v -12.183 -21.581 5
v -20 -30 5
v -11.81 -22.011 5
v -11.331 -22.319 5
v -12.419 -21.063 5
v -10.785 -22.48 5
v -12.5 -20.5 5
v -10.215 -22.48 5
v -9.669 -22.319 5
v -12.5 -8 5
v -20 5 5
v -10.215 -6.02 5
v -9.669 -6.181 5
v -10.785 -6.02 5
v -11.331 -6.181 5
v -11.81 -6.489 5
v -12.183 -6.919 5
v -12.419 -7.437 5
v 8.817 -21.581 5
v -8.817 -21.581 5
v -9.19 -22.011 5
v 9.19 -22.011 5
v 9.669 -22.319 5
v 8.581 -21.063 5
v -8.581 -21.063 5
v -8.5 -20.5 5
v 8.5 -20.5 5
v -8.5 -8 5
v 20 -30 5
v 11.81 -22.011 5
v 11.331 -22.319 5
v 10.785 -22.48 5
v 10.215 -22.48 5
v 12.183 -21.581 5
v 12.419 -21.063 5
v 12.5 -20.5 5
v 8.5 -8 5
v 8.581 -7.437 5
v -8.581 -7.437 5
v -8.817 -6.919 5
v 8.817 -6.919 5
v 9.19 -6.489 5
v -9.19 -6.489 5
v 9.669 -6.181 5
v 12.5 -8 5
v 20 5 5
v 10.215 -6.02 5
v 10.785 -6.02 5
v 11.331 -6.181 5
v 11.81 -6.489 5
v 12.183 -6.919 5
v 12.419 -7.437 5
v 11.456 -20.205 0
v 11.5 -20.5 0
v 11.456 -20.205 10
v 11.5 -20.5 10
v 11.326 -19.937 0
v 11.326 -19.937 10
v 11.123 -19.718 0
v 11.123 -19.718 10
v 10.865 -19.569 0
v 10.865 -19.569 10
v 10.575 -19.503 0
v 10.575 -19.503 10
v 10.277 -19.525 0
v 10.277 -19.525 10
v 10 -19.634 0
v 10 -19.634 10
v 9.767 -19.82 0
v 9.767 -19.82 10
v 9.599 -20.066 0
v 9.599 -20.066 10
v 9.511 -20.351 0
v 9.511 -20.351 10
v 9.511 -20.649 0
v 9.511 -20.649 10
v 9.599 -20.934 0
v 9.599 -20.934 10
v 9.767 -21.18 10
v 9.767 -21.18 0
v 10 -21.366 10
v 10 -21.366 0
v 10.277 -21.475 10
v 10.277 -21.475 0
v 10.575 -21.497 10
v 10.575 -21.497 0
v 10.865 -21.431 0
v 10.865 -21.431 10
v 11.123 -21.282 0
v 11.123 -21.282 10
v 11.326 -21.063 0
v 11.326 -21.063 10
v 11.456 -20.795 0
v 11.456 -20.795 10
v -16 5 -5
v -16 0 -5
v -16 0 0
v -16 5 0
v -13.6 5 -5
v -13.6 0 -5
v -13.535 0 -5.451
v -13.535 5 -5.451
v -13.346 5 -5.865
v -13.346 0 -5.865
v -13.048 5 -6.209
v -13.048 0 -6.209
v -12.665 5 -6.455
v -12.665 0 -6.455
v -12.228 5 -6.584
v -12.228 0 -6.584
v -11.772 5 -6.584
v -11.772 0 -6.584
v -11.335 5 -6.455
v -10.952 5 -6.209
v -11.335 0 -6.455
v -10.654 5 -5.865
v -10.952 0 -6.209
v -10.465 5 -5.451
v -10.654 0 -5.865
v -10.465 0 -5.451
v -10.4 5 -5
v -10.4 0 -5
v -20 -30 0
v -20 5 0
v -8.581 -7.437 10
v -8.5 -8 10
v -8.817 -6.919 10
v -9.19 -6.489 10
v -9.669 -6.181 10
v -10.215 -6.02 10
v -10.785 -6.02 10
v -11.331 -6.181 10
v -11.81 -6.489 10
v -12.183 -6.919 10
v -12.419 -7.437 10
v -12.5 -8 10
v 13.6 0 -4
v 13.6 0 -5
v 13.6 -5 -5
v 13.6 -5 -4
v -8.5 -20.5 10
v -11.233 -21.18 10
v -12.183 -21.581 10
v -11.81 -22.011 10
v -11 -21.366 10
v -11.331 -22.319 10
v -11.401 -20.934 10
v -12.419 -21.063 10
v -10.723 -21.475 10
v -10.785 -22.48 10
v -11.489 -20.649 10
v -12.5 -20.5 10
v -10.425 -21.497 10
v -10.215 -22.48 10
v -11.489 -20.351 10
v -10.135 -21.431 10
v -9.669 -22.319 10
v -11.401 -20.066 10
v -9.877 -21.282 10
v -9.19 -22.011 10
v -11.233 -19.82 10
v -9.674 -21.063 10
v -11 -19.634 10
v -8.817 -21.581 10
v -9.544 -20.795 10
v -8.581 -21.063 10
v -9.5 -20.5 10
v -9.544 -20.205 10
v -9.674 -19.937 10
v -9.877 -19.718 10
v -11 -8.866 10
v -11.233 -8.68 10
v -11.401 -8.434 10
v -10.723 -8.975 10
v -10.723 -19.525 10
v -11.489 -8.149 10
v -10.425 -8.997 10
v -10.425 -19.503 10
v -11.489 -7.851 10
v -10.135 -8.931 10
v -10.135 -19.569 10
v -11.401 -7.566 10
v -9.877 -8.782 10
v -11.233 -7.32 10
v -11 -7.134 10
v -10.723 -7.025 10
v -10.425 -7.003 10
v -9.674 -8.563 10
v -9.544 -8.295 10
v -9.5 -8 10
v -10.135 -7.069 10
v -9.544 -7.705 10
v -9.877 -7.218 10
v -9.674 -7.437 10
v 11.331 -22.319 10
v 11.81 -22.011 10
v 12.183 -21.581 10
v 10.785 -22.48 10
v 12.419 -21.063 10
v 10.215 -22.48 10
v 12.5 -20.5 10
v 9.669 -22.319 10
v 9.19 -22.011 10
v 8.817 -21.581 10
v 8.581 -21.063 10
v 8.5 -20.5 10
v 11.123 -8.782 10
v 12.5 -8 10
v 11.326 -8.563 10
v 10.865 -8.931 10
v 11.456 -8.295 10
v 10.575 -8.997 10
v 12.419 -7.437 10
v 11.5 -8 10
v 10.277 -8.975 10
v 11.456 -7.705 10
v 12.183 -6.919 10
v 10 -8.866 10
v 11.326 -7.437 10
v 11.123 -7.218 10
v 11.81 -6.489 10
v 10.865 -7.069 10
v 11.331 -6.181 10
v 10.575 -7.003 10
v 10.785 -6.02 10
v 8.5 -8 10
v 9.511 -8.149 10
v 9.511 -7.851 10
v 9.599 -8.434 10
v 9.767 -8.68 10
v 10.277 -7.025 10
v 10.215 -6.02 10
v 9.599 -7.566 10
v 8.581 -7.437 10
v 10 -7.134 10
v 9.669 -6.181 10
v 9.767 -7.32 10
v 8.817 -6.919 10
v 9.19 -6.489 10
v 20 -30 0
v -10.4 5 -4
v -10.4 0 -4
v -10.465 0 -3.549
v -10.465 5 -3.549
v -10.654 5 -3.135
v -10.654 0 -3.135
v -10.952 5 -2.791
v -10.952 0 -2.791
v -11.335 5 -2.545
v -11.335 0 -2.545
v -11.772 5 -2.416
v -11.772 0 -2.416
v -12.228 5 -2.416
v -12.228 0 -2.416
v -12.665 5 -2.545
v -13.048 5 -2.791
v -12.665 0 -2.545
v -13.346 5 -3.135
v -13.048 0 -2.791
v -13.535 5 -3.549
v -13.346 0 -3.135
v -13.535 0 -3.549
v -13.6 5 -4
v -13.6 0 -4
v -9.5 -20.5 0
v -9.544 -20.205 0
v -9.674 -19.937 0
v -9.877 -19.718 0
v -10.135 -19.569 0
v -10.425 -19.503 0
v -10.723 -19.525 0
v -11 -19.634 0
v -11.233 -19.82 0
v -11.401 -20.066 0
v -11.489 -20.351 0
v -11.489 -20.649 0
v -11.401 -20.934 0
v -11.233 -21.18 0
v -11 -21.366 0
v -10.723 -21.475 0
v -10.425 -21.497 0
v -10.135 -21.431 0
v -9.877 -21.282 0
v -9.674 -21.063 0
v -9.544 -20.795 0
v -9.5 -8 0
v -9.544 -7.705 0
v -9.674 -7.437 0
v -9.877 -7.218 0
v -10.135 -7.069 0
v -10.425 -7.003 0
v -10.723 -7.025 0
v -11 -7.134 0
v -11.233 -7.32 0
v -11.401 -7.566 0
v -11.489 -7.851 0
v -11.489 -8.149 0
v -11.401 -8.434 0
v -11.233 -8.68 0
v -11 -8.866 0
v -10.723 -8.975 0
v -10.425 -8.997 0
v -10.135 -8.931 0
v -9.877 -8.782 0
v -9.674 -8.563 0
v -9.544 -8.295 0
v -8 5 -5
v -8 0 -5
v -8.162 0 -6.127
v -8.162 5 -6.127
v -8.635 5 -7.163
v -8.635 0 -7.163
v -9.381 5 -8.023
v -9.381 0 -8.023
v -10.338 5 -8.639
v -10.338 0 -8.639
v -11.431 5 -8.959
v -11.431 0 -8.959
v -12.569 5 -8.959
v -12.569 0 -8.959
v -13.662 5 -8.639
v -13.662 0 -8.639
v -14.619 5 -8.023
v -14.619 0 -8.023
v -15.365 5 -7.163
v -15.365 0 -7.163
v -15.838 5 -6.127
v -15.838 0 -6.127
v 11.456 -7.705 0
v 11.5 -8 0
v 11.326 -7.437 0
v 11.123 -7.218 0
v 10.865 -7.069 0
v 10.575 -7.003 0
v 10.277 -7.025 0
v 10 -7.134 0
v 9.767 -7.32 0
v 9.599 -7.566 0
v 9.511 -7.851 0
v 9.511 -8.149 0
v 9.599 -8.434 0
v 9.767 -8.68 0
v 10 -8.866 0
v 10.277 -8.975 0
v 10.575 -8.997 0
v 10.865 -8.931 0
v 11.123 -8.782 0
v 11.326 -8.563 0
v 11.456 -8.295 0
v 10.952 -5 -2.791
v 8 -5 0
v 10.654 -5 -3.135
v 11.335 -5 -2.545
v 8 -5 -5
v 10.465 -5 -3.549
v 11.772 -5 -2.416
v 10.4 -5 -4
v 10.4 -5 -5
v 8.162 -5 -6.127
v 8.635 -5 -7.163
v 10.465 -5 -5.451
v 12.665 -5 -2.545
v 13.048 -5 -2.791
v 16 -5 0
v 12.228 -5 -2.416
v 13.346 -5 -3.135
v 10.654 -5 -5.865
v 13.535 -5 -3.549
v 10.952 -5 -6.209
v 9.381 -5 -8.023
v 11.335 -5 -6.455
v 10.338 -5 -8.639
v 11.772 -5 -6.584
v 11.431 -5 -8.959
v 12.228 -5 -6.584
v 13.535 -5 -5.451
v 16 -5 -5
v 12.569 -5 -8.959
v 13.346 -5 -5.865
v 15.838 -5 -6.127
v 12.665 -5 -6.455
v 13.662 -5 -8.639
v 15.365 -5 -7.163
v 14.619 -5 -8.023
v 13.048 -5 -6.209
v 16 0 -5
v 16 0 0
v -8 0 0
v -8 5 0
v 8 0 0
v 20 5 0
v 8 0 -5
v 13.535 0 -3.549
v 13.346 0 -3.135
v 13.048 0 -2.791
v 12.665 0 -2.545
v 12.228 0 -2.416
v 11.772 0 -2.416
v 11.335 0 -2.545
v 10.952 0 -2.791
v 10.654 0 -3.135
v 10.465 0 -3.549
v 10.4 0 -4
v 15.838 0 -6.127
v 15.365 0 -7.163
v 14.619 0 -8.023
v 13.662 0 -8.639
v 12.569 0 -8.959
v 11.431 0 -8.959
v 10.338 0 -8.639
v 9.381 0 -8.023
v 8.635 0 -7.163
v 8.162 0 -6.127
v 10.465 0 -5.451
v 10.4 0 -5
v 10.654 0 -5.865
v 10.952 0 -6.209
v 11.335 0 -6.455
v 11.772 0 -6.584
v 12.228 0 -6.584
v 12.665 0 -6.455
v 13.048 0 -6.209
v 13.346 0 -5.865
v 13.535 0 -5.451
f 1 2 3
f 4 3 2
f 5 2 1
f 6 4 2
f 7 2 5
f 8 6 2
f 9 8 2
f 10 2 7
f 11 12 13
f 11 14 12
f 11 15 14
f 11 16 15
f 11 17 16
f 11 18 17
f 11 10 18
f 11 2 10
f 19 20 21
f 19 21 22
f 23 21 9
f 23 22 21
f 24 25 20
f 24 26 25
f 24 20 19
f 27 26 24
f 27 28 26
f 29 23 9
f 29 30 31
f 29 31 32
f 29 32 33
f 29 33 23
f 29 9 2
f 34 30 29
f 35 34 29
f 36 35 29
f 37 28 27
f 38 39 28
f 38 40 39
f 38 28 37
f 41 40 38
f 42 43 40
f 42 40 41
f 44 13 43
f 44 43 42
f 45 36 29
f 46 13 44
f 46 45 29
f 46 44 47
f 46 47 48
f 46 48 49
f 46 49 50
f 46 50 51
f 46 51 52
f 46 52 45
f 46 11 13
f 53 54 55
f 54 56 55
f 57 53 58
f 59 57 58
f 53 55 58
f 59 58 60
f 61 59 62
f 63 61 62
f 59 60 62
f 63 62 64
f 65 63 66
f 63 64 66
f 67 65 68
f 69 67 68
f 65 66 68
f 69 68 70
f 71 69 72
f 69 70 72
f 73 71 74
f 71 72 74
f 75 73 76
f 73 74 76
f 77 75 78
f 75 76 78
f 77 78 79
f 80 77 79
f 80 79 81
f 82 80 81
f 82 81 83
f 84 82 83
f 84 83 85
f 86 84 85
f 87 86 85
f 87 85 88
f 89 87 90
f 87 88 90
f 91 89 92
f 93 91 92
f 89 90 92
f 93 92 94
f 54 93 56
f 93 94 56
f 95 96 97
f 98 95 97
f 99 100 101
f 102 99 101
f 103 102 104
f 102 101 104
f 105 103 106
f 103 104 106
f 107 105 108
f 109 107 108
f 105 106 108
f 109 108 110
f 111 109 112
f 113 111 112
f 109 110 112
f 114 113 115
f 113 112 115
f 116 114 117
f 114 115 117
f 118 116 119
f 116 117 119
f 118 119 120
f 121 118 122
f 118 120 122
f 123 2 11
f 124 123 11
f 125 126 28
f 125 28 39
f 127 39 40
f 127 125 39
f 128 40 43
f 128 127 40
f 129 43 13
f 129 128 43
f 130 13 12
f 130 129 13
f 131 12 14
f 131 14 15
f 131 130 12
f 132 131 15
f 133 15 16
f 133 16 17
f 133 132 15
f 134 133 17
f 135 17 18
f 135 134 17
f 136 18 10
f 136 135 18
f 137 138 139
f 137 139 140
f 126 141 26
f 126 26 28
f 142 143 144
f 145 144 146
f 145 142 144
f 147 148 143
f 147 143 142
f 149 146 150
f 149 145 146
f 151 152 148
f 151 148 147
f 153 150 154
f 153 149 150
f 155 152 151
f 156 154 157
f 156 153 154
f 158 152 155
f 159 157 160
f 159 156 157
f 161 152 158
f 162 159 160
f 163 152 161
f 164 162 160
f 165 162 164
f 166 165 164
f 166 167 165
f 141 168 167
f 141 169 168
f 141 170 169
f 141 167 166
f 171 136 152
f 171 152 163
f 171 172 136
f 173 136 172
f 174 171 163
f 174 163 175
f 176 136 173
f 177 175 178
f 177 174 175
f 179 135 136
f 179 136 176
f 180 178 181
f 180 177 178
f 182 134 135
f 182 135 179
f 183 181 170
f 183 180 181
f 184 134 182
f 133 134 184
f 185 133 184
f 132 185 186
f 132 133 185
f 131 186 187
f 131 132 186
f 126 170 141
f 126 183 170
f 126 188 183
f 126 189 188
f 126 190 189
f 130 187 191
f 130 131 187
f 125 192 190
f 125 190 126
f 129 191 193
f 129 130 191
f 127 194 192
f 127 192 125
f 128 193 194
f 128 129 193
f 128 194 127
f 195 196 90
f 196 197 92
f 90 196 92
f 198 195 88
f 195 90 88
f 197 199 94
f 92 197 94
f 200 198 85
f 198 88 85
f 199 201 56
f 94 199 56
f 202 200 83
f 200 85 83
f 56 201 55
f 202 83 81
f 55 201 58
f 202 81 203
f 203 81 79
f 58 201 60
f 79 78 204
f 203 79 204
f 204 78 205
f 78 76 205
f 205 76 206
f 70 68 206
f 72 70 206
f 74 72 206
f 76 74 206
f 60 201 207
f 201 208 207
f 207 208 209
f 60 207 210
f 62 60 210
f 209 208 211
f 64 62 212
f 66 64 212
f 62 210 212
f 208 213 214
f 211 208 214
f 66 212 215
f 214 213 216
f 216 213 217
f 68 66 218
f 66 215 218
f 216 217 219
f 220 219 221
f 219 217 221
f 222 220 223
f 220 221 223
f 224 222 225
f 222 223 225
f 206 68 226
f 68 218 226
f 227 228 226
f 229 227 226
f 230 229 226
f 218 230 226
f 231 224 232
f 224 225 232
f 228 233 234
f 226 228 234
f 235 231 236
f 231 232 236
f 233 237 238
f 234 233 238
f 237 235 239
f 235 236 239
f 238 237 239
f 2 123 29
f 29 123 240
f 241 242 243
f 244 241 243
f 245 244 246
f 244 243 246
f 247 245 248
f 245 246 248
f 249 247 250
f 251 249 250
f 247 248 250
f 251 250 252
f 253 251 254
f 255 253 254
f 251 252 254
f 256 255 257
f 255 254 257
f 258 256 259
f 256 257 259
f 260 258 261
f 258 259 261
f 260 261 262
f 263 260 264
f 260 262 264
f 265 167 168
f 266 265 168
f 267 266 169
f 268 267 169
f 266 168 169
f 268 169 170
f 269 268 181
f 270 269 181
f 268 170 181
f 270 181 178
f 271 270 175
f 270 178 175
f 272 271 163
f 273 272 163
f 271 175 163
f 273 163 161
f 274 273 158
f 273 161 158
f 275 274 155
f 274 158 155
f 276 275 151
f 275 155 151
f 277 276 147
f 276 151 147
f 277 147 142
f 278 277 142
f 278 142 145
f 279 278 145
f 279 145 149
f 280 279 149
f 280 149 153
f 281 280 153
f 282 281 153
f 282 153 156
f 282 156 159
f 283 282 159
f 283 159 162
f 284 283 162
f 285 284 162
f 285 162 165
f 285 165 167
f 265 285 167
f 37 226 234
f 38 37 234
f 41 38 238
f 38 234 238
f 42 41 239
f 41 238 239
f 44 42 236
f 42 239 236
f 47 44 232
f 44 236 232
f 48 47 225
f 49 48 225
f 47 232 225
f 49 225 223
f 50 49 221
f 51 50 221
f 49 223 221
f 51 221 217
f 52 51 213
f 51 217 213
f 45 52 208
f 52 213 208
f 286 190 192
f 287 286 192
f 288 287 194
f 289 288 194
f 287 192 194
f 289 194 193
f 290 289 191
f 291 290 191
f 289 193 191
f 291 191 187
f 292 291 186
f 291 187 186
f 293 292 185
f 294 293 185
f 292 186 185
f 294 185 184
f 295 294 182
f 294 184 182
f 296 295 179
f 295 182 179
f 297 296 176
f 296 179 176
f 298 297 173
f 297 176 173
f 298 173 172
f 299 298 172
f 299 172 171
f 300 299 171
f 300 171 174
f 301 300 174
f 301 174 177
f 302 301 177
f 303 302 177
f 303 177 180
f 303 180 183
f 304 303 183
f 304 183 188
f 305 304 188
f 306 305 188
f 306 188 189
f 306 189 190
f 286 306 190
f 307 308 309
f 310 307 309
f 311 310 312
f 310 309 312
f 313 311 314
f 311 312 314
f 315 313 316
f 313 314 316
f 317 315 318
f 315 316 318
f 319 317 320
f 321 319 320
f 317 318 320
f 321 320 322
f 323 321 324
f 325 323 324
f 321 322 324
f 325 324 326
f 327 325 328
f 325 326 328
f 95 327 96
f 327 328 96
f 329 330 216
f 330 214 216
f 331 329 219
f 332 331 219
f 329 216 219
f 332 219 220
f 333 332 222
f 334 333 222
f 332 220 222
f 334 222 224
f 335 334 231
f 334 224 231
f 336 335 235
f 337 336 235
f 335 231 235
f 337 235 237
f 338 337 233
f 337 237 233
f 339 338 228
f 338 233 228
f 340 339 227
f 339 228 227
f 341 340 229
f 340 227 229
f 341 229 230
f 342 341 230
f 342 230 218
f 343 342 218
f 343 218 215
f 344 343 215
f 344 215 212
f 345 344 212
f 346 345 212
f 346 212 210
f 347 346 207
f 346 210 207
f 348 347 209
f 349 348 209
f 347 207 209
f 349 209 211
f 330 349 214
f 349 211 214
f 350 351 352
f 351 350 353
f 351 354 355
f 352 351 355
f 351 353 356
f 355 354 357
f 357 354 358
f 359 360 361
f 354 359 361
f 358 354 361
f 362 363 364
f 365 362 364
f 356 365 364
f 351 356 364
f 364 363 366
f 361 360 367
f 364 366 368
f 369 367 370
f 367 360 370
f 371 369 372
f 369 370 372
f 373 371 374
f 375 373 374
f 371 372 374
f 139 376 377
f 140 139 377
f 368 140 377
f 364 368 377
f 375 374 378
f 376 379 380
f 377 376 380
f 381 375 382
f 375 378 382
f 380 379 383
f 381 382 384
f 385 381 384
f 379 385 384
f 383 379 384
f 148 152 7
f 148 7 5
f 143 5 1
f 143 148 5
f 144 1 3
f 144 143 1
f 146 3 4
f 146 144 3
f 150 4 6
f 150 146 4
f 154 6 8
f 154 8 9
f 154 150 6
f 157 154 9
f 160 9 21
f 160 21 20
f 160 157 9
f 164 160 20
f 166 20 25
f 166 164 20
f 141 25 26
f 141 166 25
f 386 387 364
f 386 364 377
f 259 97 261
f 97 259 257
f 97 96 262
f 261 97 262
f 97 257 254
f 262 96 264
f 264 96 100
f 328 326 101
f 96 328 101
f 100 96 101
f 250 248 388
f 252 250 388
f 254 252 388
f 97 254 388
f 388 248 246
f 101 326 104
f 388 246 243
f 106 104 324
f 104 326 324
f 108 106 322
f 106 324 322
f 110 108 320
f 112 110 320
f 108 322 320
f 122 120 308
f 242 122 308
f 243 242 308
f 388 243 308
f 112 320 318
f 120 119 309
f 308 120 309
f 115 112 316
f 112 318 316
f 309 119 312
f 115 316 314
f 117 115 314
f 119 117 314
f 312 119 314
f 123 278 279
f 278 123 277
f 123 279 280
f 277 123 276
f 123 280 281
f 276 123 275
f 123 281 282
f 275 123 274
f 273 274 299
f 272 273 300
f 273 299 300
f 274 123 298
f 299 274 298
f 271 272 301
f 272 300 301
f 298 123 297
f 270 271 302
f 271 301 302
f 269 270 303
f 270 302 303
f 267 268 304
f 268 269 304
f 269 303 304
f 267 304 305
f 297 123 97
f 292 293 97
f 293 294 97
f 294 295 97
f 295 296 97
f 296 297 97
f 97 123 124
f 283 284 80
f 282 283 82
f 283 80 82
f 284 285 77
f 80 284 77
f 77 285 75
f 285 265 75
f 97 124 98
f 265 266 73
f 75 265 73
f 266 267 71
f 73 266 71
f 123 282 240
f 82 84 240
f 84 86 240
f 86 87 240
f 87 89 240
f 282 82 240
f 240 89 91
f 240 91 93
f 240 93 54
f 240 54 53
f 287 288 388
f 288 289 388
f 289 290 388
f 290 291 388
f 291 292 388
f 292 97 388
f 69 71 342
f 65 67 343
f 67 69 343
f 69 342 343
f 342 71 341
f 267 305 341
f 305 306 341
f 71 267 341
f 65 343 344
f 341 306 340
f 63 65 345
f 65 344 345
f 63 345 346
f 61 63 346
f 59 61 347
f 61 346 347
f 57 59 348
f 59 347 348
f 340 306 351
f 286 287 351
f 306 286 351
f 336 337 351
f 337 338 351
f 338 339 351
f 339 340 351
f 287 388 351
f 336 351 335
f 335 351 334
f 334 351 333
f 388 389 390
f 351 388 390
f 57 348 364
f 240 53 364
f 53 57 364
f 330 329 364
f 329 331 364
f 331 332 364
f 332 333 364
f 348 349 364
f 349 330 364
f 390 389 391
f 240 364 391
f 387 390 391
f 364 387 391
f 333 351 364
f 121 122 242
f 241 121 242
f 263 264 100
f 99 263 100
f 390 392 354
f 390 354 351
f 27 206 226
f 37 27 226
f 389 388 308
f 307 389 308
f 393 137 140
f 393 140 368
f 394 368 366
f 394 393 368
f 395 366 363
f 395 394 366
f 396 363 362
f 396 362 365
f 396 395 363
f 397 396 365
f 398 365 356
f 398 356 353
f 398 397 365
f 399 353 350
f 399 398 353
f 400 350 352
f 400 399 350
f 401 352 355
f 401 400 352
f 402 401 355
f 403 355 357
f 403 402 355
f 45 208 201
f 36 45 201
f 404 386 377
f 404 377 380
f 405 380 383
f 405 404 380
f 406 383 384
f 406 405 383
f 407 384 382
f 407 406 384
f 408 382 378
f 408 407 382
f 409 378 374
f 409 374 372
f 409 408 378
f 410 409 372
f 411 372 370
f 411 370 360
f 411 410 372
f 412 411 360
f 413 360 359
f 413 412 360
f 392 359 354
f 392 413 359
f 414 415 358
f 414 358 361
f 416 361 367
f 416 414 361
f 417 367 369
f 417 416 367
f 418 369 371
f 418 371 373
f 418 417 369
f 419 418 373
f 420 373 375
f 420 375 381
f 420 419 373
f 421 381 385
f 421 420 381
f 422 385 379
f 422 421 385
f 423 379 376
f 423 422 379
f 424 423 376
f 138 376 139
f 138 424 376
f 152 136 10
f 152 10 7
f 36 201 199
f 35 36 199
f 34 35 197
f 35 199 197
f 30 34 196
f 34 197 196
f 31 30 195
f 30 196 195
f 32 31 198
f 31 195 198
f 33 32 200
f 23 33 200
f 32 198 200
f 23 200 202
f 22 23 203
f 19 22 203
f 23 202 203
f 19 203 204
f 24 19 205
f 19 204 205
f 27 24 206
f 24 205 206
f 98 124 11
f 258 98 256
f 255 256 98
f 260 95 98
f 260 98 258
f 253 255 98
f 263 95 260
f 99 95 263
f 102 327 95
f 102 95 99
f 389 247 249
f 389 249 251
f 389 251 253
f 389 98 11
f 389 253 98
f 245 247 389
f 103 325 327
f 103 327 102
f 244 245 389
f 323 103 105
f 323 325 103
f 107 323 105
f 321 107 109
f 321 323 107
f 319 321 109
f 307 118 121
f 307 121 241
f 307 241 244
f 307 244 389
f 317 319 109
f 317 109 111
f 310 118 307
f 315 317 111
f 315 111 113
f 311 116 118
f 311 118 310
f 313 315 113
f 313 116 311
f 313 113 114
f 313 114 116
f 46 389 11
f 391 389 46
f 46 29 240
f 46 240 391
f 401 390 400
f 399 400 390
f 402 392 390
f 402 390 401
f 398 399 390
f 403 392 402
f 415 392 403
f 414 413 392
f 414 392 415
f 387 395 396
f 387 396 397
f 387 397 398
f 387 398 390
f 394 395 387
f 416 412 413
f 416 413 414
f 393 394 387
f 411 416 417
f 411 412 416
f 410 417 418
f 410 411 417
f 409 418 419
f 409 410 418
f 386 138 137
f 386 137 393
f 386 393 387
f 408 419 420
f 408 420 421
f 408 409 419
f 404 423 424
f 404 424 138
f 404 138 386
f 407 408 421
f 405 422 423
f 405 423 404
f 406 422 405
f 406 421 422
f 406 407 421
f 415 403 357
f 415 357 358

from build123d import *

# Parameters (mm, degrees)
BOSS_EXTRUDE1_DEPTH = 5
BOSS_EXTRUDE2_DEPTH = 5
BOSS_EXTRUDE3_DEPTH = 30
SKETCH2_W           = 10
SKETCH2_H           = 35
SKETCH2_R           = 1
CUT_EXTRUDE1_DEPTH  = 45.676615807
BOSS_EXTRUDE4_START = 5
SKETCH2_3_R         = 1
BOSS_EXTRUDE4_DEPTH = 5


with BuildPart() as part:
    # Sketch1 → Boss-Extrude1 (new body)
    with BuildSketch(Plane(origin=(0, 0, 0), x_dir=(1, 0, 0), z_dir=(0, 1, 0))):
        with BuildLine():
            Line((-16, 0), (-30, 0))
            Line((-30, 0), (-30, -5))
            Line((-30, -5), (30, -5))
            Line((30, -5), (30, 0))
            Line((30, 0), (-8, 0))
            Line((-8, 0), (-8, 5))
            ThreePointArc((-8, 5), (-12, 9), (-16, 5))
            Line((-16, 5), (-16, 0))
        make_face()
        with BuildLine():
            ThreePointArc((-13.6, 5), (-12, 6.6), (-10.4, 5))
            Line((-10.4, 5), (-10.4, 4))
            ThreePointArc((-10.4, 4), (-12, 2.4), (-13.6, 4))
            Line((-13.6, 4), (-13.6, 5))
        make_face(mode=Mode.SUBTRACT)
    extrude(amount=BOSS_EXTRUDE1_DEPTH)

    # Sketch1<3> → Boss-Extrude2 (add)
    with BuildSketch(Plane(origin=(0, 0, 0), x_dir=(1, 0, 0), z_dir=(0, 1, 0))):
        with BuildLine():
            Line((-30, 0), (-30, -5))
            Line((-30, -5), (30, -5))
            Line((30, -5), (30, 0))
            Line((30, 0), (16, 0))
            Line((16, 0), (16, 5))
            ThreePointArc((16, 5), (12, 9), (8, 5))
            Line((8, 5), (8, 0))
            Line((8, 0), (-30, 0))
        make_face()
        with BuildLine():
            Line((13.6, 5), (13.6, 4))
            ThreePointArc((13.6, 4), (12, 2.4), (10.4, 4))
            Line((10.4, 4), (10.4, 5))
            ThreePointArc((10.4, 5), (12, 6.6), (13.6, 5))
        make_face(mode=Mode.SUBTRACT)
    extrude(amount=-BOSS_EXTRUDE2_DEPTH)

    # Sketch1<4> → Boss-Extrude3 (add)
    with BuildSketch(Plane(origin=(0, 0, 0), x_dir=(1, 0, 0), z_dir=(0, 1, 0))):
        Polygon((-16, 0), (-30, 0), (-30, -5), (30, -5), (30, 0), (16, 0), (8, 0), (-8, 0), align=None)
    extrude(amount=-BOSS_EXTRUDE3_DEPTH)

    # Sketch2 → Cut-Extrude1 (cut, through all)
    with BuildSketch(Plane.XY.offset(5)):
        with Locations((-25, -12.5)):
            Rectangle(SKETCH2_W, SKETCH2_H)
        with Locations((25, -12.5)):
            Rectangle(SKETCH2_W, SKETCH2_H)
        with Locations((-10.5, -8)):
            Circle(SKETCH2_R)
        with Locations((-10.5, -20.5)):
            Circle(SKETCH2_R)
        with Locations((10.5, -20.5)):
            Circle(SKETCH2_R)
        with Locations((10.5, -8)):
            Circle(SKETCH2_R)
    extrude(amount=-CUT_EXTRUDE1_DEPTH, mode=Mode.SUBTRACT)

    # Sketch2<3> → Boss-Extrude4 (add)
    # profile 1 of 2: a face of its own
    with BuildSketch(Plane.XY.offset(5).offset(BOSS_EXTRUDE4_START)):
        with BuildLine():
            Line((-8.5, -20.5), (-8.5, -8))
            ThreePointArc((-8.5, -8), (-10.5, -6), (-12.5, -8))
            Line((-12.5, -8), (-12.5, -20.5))
            ThreePointArc((-12.5, -20.5), (-10.5, -22.5), (-8.5, -20.5))
        make_face()
        with Locations((-10.5, -20.5)):
            Circle(SKETCH2_3_R, mode=Mode.SUBTRACT)
        with Locations((-10.5, -8)):
            Circle(SKETCH2_3_R, mode=Mode.SUBTRACT)
    # profile 2 of 2: a face of its own
    with BuildSketch(Plane.XY.offset(5).offset(BOSS_EXTRUDE4_START)):
        with BuildLine():
            ThreePointArc((12.5, -8), (10.5, -6), (8.5, -8))
            Line((8.5, -8), (8.5, -20.5))
            ThreePointArc((8.5, -20.5), (10.5, -22.5), (12.5, -20.5))
            Line((12.5, -20.5), (12.5, -8))
        make_face()
        with Locations((10.5, -20.5)):
            Circle(SKETCH2_3_R, mode=Mode.SUBTRACT)
        with Locations((10.5, -8)):
            Circle(SKETCH2_3_R, mode=Mode.SUBTRACT)
    extrude(amount=-BOSS_EXTRUDE4_DEPTH)


solid = part.part
